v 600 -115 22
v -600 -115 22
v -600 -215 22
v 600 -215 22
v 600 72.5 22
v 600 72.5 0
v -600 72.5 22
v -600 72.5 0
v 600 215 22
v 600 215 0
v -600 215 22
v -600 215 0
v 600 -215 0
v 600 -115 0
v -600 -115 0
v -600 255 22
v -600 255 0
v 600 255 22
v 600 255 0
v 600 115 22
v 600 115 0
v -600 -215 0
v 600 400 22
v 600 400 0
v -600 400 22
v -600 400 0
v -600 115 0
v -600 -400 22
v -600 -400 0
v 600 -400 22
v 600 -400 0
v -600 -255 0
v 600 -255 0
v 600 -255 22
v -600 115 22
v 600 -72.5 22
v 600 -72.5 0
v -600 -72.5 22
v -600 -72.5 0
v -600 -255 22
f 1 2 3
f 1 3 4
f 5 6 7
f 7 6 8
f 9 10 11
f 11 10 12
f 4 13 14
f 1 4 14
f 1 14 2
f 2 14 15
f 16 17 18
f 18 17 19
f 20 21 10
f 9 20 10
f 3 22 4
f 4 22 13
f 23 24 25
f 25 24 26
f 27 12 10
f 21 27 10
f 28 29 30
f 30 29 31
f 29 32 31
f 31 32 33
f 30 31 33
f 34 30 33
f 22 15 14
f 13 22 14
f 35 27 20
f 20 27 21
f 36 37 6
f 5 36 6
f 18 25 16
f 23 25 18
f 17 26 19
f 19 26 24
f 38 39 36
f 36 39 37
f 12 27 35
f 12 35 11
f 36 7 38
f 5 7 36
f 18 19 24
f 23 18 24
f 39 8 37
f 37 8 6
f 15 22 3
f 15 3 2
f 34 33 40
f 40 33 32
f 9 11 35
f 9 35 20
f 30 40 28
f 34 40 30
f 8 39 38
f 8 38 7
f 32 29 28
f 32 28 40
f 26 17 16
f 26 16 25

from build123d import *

# Parameters (mm, degrees)
F0_W     = 145
F0_H     = 145
F0_W_2   = 383
F0_W_3   = 382
F1_DEPTH = 22
F0_H_2   = 100


with BuildPart() as f1:
    # F0 (on Top) → F1 (new body)
    with BuildSketch(Plane.XY):
        with Locations((527.5, 327.5)):
            Rectangle(F0_W, F0_H)
        with Locations((263.5, 327.5)):
            Rectangle(F0_W_2, F0_H)
        with Locations((-0.5, 327.5)):
            Rectangle(F0_W, F0_H)
        with Locations((-264, 327.5)):
            Rectangle(F0_W_3, F0_H)
        with Locations((-527.5, 327.5)):
            Rectangle(F0_W, F0_H)
    extrude(amount=F1_DEPTH)


with BuildPart() as f1b:
    # F0 (on Top) → F1, piece 2 (new body)
    with BuildSketch(Plane.XY):
        with Locations((-527.5, 165)):
            Rectangle(F0_W, F0_H_2)
        with Locations((-264, 165)):
            Rectangle(F0_W_3, F0_H_2)
        with Locations((-0.5, 165)):
            Rectangle(F0_W, F0_H_2)
        with Locations((263.5, 165)):
            Rectangle(F0_W_2, F0_H_2)
        with Locations((527.5, 165)):
            Rectangle(F0_W, F0_H_2)
    extrude(amount=F1_DEPTH)


with BuildPart() as f1c:
    # F0 (on Top) → F1, piece 3 (new body)
    with BuildSketch(Plane.XY):
        with Locations((527.5, 0)):
            Rectangle(F0_W, F0_H)
        with Locations((263.5, 0)):
            Rectangle(F0_W_2, F0_H)
        with Locations((-0.5, 0)):
            Rectangle(F0_W, F0_H)
        with Locations((-264, 0)):
            Rectangle(F0_W_3, F0_H)
        with Locations((-527.5, 0)):
            Rectangle(F0_W, F0_H)
    extrude(amount=F1_DEPTH)


with BuildPart() as f1d:
    # F0 (on Top) → F1, piece 4 (new body)
    with BuildSketch(Plane.XY):
        with Locations((-527.5, -165)):
            Rectangle(F0_W, F0_H_2)
        with Locations((-264, -165)):
            Rectangle(F0_W_3, F0_H_2)
        with Locations((-0.5, -165)):
            Rectangle(F0_W, F0_H_2)
        with Locations((263.5, -165)):
            Rectangle(F0_W_2, F0_H_2)
        with Locations((527.5, -165)):
            Rectangle(F0_W, F0_H_2)
    extrude(amount=F1_DEPTH)


with BuildPart() as f1e:
    # F0 (on Top) → F1, piece 5 (new body)
    with BuildSketch(Plane.XY):
        with Locations((527.5, -327.5)):
            Rectangle(F0_W, F0_H)
        with Locations((263.5, -327.5)):
            Rectangle(F0_W_2, F0_H)
        with Locations((-0.5, -327.5)):
            Rectangle(F0_W, F0_H)
        with Locations((-264, -327.5)):
            Rectangle(F0_W_3, F0_H)
        with Locations((-527.5, -327.5)):
            Rectangle(F0_W, F0_H)
    extrude(amount=F1_DEPTH)


solid = Compound([f1.part, f1b.part, f1c.part, f1d.part, f1e.part])
